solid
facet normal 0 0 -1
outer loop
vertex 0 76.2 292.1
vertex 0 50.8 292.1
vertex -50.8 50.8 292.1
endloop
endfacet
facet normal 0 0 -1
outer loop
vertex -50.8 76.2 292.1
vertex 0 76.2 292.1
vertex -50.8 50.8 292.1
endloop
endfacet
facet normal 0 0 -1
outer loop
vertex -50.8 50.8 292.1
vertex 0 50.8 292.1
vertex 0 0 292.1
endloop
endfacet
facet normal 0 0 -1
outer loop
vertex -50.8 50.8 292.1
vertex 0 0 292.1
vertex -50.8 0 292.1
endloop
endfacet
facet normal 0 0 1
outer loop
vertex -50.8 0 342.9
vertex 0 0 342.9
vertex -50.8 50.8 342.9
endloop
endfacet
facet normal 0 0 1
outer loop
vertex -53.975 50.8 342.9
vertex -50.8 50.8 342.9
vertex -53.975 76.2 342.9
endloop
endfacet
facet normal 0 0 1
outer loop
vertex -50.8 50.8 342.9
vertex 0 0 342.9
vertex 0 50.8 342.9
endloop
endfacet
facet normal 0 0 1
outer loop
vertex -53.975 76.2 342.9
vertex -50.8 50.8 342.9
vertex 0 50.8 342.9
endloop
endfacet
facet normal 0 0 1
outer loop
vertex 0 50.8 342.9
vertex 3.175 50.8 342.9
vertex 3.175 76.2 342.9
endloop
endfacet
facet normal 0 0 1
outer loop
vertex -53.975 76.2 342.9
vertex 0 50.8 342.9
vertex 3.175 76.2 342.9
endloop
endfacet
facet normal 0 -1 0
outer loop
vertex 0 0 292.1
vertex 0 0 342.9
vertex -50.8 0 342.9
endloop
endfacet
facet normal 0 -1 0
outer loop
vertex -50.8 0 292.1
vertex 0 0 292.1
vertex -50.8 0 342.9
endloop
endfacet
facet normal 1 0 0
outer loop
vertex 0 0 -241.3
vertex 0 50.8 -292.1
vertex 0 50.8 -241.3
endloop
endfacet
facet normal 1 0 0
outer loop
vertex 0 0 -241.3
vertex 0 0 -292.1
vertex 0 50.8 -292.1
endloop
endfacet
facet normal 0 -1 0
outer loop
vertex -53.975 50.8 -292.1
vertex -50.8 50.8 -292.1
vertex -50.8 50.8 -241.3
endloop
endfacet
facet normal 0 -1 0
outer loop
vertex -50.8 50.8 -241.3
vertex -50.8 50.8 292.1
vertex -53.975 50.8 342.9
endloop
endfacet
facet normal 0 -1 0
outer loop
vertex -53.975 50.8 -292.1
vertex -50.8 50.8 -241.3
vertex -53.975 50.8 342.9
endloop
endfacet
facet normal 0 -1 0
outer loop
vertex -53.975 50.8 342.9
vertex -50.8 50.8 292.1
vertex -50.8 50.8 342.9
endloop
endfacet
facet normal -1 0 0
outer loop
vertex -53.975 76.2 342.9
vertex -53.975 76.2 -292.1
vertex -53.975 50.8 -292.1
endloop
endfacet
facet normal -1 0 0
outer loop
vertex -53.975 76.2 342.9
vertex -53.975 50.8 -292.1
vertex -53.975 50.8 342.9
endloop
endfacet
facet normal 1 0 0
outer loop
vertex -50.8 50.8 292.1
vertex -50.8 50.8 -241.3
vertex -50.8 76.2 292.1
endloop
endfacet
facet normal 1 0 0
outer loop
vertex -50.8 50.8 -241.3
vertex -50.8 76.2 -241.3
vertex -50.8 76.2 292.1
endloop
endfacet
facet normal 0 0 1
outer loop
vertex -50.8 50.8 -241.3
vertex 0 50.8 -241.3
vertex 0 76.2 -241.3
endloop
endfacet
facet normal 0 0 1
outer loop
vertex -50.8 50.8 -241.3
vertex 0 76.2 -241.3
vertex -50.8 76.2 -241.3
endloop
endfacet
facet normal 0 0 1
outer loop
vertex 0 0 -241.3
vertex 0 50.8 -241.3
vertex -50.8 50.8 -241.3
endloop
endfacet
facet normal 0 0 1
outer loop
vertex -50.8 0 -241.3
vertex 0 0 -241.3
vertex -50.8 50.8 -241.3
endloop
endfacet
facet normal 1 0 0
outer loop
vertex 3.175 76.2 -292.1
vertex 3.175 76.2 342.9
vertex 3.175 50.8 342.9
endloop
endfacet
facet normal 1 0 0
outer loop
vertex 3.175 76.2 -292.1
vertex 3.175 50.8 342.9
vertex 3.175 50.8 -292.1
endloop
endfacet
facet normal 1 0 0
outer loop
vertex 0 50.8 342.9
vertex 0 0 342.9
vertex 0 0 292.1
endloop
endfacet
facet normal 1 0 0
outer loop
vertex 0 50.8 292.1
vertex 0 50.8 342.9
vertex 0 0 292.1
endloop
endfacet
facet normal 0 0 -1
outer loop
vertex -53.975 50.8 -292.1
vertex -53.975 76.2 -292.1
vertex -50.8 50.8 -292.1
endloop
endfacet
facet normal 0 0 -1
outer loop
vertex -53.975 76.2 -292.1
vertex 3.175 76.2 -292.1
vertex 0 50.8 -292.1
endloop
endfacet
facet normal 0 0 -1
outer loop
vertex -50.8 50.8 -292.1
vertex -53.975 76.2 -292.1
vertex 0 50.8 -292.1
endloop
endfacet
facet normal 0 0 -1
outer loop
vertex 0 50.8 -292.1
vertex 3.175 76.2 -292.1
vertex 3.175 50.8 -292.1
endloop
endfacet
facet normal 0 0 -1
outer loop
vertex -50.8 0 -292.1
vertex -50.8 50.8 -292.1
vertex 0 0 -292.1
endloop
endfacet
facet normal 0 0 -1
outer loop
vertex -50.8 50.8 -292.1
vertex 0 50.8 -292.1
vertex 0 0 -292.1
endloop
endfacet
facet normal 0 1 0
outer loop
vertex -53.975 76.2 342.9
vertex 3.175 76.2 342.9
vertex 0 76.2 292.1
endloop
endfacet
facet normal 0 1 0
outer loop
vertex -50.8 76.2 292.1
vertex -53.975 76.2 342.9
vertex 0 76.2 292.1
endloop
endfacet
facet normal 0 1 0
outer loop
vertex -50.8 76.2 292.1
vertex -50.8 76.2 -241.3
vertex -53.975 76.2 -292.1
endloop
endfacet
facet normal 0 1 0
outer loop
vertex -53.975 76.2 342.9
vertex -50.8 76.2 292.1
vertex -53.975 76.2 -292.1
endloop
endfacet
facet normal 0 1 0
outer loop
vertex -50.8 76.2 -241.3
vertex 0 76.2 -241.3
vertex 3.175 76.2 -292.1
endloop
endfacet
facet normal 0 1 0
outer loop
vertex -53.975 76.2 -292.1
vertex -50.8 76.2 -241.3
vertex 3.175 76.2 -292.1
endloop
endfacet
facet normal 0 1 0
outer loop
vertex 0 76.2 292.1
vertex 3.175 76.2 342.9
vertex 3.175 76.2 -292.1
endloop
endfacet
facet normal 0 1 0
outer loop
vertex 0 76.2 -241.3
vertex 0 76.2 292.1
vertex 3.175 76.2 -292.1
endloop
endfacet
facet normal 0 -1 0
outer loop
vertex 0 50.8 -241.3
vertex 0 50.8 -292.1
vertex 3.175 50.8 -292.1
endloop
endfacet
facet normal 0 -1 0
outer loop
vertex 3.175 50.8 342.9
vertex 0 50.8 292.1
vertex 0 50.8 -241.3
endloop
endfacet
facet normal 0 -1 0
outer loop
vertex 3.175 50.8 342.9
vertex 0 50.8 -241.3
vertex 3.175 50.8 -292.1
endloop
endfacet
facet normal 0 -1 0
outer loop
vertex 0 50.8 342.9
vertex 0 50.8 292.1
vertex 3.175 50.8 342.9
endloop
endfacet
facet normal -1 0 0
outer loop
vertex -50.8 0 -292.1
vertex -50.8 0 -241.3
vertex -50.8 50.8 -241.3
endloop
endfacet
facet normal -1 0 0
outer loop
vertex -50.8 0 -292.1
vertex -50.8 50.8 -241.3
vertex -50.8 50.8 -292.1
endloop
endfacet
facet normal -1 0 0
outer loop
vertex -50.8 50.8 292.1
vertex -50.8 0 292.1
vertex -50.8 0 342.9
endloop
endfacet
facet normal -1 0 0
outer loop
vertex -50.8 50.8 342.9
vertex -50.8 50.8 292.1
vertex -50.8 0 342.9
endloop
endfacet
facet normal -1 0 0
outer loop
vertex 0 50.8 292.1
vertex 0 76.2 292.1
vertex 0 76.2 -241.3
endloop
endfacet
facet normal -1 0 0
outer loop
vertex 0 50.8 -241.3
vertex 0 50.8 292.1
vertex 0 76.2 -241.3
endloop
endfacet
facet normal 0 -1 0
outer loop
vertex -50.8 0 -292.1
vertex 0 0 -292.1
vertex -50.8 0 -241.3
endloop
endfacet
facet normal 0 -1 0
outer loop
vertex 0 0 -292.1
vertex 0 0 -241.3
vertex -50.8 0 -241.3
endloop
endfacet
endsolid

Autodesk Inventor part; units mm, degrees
ref_plane "YZ Plane" through (0, 0, 0) normal (1, 0, 0) x (0, 1, 0)
ref_plane "XZ Plane" through (0, 0, 0) normal (0, 1, 0) x (-1, 0, 0)
ref_plane "XY Plane" through (0, 0, 0) normal (0, 0, 1) x (1, 0, 0)
sketch "Sketch1" plane through (0, 0, 0) normal (0, 1, 0) x (-1, 0, 0)
  line L0 (50.8, 342.9) -> (0, 342.9)
  line L1 (0, 342.9) -> (0, 292.1)
  line L2 (0, 292.1) -> (50.8, 292.1)
  line L3 (50.8, 292.1) -> (50.8, 342.9)
  line L4 (50.8, -292.1) -> (0, -292.1)
  line L5 (0, -292.1) -> (0, -241.3)
  line L6 (0, -241.3) -> (50.8, -241.3)
  line L7 (50.8, -241.3) -> (50.8, -292.1)
  line L8 (0, 0) -> (-42.6013, 0)
  dimension "d0" = 50.8
  dimension "d10" = 533.4
extrude "Extrusion1" add sketch "Sketch1" along normal blind 76.2
sketch "Sketch2" plane through (0, 0, 342.9) normal (1, 0, 0) x (0, 0, -1)
  line L0 (0, 76.2) -> (50.8, 76.2) projected
  line L1 (635, 0) -> (635, 76.2) projected
  line L2 (0, 76.2) -> (635, 76.2)
  line L3 (635, 76.2) -> (635, 50.8)
  line L4 (635, 50.8) -> (0, 50.8)
  line L5 (0, 50.8) -> (0, 76.2)
  point P0 (342.9, 0)
  dimension "d4" = 25.4
extrude "Extrusion2" add sketch "Sketch2" along normal blind 3.175
sketch "Sketch3" plane through (-50.8, 0, 292.1) normal (-1, 0, 0) x (0, 0, 1)
  line L0 (50.8, 76.2) -> (-584.2, 76.2)
  line L1 (-584.2, 76.2) -> (-584.2, 50.8)
  line L2 (-584.2, 50.8) -> (50.8, 50.8)
  line L3 (50.8, 50.8) -> (50.8, 76.2)
  line L4 (-533.4, 50.8) -> (0, 50.8) projected
  point P0 (-292.1, 0)
  dimension "d11" = 635
extrude "Extrusion3" add sketch "Sketch3" along normal blind 3.175
properties part number "crossbeam"
